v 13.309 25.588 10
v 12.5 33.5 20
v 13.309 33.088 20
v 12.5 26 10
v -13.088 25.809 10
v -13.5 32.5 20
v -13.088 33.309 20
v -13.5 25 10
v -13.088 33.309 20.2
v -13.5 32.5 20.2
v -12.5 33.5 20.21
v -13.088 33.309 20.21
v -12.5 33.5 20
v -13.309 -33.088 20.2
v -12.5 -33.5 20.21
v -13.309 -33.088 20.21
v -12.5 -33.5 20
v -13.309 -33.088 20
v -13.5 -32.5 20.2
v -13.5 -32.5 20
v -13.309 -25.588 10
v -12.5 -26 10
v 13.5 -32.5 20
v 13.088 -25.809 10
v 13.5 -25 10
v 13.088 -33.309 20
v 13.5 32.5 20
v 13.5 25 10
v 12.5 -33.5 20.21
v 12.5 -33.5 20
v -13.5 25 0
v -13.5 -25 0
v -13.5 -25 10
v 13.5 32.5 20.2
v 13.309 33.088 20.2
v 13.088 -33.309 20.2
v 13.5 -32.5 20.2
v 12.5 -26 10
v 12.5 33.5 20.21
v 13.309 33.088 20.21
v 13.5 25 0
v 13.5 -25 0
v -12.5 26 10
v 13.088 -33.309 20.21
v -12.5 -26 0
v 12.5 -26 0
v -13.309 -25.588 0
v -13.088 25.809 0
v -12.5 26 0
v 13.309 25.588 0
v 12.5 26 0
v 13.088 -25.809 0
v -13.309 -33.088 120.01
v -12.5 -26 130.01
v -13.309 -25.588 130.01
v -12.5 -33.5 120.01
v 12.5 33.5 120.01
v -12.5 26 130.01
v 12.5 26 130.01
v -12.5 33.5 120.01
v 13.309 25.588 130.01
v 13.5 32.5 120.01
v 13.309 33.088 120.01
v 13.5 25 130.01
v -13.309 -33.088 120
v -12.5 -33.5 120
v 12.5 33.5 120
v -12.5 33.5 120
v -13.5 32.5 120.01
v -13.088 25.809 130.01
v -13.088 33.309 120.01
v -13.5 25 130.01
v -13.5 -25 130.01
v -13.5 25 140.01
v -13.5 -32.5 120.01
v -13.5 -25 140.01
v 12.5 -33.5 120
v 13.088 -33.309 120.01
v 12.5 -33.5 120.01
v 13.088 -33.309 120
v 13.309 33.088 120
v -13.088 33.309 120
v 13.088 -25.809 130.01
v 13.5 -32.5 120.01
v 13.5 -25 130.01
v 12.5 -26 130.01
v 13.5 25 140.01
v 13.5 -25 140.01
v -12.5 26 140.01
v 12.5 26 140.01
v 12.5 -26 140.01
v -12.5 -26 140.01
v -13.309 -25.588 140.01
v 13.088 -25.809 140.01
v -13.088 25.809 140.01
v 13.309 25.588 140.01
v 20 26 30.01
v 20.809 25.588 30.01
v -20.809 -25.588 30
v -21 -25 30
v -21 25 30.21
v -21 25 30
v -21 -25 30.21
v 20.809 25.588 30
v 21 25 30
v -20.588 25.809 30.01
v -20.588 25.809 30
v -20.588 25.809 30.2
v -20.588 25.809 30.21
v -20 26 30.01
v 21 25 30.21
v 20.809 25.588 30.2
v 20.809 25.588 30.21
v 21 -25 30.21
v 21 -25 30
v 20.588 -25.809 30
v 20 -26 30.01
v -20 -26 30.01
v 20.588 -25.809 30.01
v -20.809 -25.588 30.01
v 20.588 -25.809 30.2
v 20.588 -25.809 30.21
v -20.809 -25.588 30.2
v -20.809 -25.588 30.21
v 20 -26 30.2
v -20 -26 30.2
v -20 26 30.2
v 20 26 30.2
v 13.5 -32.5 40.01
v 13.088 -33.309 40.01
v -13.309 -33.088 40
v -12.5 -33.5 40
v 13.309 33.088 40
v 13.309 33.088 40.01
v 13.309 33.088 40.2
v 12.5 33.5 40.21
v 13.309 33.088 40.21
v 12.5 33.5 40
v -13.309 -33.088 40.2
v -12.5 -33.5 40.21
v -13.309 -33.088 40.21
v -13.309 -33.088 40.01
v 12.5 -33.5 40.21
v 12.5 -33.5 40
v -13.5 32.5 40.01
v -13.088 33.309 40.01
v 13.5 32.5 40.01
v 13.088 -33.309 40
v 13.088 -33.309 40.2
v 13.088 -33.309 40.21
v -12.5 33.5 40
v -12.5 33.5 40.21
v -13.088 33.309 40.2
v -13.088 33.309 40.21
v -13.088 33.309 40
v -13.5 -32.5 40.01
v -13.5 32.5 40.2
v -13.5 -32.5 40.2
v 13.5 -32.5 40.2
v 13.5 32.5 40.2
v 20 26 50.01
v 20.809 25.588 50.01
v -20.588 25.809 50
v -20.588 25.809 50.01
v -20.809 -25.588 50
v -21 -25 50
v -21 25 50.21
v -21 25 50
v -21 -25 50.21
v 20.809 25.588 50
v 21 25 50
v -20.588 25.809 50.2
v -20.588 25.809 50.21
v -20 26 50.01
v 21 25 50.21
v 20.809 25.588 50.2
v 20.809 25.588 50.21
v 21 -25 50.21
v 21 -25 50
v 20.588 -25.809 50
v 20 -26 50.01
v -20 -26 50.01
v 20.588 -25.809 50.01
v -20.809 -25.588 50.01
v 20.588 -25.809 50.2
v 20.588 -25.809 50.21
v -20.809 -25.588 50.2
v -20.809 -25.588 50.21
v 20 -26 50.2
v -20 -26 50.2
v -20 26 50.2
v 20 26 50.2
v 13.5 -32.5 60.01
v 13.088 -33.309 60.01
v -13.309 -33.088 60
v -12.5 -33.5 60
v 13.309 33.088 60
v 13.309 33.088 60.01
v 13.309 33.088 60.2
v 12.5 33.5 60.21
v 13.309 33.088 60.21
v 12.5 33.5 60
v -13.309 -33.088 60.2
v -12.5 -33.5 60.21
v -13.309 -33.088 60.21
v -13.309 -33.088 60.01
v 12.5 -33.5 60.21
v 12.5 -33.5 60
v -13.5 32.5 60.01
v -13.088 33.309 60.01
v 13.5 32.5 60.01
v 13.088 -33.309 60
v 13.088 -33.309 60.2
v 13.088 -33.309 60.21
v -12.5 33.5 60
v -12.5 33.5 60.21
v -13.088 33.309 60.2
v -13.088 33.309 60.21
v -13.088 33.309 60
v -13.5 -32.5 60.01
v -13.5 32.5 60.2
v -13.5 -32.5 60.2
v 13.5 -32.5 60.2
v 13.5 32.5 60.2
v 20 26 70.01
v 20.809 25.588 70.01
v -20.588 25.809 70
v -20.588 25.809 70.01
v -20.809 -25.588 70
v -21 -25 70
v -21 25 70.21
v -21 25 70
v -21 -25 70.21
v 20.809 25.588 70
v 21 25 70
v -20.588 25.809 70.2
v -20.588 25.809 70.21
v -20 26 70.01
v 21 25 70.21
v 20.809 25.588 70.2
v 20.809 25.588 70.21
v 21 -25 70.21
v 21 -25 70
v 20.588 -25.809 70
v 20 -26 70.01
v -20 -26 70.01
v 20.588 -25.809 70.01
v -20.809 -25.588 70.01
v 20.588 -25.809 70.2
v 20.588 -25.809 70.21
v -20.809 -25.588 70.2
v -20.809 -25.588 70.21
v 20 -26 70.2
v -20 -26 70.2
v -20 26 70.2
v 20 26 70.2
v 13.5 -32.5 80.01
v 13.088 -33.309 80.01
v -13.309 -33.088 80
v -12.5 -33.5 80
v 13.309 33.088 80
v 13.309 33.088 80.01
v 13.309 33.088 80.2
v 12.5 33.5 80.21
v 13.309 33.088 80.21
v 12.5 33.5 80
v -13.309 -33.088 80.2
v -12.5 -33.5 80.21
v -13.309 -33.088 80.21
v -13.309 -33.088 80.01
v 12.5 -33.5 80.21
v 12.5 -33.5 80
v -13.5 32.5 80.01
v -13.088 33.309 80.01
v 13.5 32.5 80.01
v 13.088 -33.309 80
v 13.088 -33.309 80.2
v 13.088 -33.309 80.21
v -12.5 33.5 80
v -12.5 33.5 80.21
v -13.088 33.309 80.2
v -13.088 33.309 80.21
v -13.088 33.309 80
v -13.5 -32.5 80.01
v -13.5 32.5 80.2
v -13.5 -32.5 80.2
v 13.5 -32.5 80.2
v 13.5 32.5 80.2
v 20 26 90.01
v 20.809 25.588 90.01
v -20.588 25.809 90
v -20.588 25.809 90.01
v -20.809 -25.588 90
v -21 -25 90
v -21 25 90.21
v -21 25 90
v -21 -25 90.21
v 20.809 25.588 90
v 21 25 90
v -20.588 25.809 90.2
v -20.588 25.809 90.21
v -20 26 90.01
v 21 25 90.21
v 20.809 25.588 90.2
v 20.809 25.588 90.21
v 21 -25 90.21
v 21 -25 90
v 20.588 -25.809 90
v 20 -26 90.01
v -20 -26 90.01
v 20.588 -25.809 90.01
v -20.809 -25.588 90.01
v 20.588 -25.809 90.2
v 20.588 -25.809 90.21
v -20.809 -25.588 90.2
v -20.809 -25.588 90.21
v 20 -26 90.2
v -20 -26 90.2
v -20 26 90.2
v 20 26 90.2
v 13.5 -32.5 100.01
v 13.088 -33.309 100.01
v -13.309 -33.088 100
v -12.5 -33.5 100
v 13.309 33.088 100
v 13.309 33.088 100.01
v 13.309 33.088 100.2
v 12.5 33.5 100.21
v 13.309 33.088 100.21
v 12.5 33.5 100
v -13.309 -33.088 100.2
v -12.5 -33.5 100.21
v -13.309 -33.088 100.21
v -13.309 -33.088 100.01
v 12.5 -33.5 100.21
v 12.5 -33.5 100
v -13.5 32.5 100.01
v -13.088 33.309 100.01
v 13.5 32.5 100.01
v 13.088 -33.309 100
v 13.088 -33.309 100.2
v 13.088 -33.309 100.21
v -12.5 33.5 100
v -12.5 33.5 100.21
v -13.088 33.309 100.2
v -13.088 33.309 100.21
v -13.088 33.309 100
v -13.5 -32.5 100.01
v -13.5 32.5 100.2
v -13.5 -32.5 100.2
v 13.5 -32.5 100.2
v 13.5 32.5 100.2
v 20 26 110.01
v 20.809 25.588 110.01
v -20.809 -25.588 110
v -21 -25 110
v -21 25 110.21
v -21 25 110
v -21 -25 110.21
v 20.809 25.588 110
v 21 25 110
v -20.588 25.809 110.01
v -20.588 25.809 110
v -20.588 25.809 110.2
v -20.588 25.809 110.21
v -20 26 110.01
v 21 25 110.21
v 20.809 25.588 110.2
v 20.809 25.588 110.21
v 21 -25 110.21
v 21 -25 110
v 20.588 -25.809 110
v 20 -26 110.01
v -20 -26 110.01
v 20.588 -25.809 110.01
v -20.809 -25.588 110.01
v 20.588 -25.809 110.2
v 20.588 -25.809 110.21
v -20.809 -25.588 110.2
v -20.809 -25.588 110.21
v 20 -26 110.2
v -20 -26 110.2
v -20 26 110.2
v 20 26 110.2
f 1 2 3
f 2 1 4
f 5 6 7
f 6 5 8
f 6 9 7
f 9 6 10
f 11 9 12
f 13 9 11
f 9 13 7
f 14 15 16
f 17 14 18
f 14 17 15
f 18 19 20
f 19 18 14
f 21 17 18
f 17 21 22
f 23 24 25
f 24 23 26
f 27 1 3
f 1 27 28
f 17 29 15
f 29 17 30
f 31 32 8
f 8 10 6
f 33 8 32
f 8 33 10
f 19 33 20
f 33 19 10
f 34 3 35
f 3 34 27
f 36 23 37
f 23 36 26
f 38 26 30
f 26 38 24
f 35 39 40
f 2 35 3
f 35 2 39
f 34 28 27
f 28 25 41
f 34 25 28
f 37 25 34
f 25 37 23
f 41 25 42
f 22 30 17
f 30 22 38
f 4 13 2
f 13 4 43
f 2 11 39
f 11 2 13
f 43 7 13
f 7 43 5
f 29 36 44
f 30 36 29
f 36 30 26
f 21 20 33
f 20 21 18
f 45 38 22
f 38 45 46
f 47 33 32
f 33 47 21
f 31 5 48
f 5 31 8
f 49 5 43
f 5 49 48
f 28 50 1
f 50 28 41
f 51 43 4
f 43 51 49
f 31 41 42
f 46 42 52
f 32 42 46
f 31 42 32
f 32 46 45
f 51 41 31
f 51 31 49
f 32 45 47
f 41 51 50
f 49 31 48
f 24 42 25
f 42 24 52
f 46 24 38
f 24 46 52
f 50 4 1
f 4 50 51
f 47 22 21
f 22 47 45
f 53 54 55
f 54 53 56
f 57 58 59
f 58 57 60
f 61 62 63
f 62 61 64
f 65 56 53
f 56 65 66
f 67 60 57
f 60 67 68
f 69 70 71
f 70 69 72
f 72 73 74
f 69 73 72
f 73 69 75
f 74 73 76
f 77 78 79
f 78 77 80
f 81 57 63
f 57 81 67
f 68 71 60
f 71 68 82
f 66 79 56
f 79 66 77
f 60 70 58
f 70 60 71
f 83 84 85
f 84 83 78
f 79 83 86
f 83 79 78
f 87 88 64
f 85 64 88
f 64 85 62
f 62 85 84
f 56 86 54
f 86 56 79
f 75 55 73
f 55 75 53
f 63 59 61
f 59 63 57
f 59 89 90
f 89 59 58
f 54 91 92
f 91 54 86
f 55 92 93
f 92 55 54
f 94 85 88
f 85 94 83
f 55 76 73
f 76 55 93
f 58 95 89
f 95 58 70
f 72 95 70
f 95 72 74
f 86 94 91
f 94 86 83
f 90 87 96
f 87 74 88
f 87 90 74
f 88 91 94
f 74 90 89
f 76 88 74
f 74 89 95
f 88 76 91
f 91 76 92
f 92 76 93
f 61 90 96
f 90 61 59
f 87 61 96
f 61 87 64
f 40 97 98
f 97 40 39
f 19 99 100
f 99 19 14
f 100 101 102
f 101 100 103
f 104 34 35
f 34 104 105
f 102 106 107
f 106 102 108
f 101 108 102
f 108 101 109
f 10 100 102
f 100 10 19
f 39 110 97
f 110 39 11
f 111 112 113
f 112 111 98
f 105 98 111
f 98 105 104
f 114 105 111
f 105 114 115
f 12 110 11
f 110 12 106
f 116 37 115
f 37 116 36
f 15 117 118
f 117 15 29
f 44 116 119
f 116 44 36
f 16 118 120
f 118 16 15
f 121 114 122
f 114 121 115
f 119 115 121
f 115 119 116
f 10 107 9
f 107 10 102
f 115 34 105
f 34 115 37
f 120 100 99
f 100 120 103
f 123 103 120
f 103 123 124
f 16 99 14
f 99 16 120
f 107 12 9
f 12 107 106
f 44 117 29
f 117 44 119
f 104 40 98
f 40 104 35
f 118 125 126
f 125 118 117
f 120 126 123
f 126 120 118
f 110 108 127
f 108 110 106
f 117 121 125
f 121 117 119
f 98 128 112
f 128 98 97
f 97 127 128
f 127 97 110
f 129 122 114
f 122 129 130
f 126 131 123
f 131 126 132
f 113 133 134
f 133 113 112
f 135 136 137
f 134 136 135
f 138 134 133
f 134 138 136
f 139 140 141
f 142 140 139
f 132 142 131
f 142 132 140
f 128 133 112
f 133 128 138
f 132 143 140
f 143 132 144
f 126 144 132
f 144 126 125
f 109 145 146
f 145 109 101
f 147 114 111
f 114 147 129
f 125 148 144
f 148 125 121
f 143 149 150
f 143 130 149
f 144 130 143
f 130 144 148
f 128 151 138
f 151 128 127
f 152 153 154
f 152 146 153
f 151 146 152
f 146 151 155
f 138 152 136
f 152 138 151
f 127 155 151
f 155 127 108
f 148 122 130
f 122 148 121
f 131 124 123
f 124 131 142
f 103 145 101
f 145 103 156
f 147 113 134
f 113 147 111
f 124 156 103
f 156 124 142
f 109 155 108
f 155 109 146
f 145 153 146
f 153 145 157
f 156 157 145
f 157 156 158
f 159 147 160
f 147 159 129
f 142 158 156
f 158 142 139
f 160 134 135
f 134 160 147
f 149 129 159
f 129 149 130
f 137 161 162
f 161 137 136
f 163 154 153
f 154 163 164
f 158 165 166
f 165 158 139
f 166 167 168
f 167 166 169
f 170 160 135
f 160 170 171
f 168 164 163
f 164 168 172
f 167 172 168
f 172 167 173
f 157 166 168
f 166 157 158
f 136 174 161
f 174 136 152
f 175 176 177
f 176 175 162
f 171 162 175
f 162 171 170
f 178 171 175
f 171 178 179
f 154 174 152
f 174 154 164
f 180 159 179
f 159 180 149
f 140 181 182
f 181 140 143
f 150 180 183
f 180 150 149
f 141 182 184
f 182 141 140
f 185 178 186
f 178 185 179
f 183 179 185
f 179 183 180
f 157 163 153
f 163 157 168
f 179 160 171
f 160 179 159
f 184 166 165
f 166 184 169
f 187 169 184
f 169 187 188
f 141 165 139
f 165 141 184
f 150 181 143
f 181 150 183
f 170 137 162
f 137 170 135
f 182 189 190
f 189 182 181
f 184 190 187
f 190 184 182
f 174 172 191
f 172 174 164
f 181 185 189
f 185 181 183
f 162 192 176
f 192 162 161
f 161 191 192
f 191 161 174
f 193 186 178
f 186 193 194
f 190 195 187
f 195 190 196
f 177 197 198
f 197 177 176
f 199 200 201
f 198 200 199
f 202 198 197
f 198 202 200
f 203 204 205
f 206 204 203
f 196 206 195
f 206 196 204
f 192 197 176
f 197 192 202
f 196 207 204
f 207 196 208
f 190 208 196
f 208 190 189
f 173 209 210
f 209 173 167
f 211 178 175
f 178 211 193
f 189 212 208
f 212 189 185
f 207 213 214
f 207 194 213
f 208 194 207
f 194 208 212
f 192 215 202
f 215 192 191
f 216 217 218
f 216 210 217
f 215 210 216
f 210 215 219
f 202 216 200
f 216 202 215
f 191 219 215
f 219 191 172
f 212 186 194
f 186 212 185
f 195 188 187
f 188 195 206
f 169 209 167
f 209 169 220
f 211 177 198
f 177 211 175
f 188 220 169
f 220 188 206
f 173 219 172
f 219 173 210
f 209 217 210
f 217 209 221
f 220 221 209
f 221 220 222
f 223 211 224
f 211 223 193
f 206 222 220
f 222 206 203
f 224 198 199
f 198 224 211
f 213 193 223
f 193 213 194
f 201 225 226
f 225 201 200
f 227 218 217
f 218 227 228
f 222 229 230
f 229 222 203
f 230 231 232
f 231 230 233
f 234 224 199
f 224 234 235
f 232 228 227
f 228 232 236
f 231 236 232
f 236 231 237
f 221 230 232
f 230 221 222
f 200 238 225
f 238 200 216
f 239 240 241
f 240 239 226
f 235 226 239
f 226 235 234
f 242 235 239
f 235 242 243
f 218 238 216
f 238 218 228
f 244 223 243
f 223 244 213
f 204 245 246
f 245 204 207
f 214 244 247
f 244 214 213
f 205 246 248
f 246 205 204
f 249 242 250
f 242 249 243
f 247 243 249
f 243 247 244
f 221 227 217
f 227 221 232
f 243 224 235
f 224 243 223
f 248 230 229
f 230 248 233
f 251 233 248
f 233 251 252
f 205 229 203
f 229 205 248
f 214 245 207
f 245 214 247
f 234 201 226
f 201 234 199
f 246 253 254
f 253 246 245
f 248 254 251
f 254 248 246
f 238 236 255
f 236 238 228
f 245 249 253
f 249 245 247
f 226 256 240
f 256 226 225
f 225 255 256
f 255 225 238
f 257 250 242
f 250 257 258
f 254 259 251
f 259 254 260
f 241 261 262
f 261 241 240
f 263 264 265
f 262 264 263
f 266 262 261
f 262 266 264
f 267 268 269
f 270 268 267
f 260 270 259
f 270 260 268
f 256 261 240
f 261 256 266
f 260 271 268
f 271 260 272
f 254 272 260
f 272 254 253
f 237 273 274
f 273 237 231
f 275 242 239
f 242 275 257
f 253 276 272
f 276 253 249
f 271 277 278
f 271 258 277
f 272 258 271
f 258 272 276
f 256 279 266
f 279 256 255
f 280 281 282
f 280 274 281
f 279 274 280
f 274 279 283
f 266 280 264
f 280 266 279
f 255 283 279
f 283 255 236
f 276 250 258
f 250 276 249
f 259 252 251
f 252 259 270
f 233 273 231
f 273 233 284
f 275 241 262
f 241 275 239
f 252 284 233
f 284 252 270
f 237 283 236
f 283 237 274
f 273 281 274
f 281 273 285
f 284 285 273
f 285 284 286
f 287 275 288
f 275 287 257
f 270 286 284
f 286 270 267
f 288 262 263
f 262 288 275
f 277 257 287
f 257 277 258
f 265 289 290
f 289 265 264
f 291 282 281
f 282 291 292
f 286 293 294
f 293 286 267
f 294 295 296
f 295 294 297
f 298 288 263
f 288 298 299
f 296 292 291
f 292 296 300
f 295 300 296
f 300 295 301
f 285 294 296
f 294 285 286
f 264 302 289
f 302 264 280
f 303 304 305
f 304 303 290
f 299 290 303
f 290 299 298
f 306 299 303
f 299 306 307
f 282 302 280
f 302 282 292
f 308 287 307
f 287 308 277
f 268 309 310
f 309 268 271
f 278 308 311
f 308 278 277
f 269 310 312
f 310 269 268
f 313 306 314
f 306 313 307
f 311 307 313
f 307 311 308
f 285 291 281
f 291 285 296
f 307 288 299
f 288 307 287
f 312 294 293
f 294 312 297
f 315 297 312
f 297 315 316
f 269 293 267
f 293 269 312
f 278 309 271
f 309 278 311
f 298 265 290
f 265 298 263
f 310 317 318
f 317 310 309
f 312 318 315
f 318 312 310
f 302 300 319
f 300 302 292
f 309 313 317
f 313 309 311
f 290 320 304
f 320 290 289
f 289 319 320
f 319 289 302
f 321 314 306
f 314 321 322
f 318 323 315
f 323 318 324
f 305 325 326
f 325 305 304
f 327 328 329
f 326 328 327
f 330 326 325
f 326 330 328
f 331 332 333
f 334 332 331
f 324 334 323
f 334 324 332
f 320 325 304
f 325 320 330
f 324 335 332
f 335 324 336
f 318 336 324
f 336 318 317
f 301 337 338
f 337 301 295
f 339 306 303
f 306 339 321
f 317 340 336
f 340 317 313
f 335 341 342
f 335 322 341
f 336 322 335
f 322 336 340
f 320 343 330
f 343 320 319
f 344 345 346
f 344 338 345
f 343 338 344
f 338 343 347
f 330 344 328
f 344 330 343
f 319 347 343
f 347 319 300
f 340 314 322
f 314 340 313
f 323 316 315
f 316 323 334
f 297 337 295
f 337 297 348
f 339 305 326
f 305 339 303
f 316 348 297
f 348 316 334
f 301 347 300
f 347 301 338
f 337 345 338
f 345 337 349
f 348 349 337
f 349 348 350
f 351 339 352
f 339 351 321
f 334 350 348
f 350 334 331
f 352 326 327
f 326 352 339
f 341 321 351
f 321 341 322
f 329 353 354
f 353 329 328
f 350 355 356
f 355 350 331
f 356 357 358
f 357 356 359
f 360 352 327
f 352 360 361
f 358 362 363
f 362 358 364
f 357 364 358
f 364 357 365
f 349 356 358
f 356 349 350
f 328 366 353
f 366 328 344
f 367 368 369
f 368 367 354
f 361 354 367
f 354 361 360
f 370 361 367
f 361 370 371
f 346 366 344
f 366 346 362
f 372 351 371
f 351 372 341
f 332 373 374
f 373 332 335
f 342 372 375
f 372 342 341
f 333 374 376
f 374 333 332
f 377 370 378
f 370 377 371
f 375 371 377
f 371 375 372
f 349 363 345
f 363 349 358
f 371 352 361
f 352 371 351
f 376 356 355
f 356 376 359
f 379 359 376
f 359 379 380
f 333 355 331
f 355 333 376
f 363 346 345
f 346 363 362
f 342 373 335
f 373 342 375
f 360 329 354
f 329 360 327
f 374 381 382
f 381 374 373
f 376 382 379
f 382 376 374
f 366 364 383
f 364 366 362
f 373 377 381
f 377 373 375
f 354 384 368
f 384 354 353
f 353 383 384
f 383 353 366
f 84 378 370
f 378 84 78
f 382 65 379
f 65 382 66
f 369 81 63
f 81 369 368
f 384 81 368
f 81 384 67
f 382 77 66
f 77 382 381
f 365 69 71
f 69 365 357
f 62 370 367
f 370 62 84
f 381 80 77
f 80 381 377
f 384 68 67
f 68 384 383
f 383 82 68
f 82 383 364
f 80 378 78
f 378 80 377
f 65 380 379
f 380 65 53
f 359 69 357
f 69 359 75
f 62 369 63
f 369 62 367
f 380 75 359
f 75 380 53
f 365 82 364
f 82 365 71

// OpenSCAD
x = 25;
y = 50;
approx_z = 100;
steps = 10;
step = round(approx_z  / steps);
z=step*steps;
step2 = floor(step * 2);
ext = 1.5;
radi = 1;
verticalsegment = 0.2;
sleeve = 20;
sleeve_ext = 0;
sleeveext = sleeve*sleeve_ext;
sleeves();
body();
module sleeves() {
  hull() {
    translate([0, 0, verticalsegment+  sleeve]) plane(x, y, 0);
    translate([0, 0,   sleeve]) plane(x, y, 0);
    translate([0, 0, sleeve- min(step,sleeve*0.5)]) sleeve(x, y);
  }
  hull() {
    translate([0, 0, sleeve- min(step,sleeve*0.5)]) sleeve(x, y);
    translate([0, 0, 0]) sleeve(x, y);
  }

  hull() {
    translate([0, 0, sleeve]) plane(x, y, z);
    translate([0, 0, z + sleeve + min(step,sleeve*0.5)]) sleeve(x, y);
  }
  hull() {
    translate([0, 0, z + sleeve + sleeve]) sleeve(x, y);
    translate([0, 0, z + sleeve + min(step,sleeve*0.5)]) sleeve(x, y);
  }
}
module body() {
  for (i = [0: step: z - step]) {
    hull() {
      translate([0, 0, verticalsegment + sleeve]) plane(x, y, i);
      translate([0, 0, sleeve]) plane(x, y, i);
    }
    hull() {
      translate([0, 0, verticalsegment + sleeve]) plane(x, y, i);
      translate([0, 0, sleeve]) plane(x, y, i + step);
    }
  }
}
module plane(x, y, z) {
  translate([0, 0, z]) linear_extrude(0.01) offset(r = radi, $fn = 10) square([x + (z % step2) * ext, y + ((z + step) % step2) * ext], center = true);
}
module sleeve(x, y) {
  translate([0, 0, 0]) linear_extrude(0.01) offset(r = radi, $fn = 10) square([x + sleeveext * 2, y + sleeveext * 2], center = true);}

function rnd(a=0,b=1)=(rands(min(a,b),max(a,b),1)[0]);
